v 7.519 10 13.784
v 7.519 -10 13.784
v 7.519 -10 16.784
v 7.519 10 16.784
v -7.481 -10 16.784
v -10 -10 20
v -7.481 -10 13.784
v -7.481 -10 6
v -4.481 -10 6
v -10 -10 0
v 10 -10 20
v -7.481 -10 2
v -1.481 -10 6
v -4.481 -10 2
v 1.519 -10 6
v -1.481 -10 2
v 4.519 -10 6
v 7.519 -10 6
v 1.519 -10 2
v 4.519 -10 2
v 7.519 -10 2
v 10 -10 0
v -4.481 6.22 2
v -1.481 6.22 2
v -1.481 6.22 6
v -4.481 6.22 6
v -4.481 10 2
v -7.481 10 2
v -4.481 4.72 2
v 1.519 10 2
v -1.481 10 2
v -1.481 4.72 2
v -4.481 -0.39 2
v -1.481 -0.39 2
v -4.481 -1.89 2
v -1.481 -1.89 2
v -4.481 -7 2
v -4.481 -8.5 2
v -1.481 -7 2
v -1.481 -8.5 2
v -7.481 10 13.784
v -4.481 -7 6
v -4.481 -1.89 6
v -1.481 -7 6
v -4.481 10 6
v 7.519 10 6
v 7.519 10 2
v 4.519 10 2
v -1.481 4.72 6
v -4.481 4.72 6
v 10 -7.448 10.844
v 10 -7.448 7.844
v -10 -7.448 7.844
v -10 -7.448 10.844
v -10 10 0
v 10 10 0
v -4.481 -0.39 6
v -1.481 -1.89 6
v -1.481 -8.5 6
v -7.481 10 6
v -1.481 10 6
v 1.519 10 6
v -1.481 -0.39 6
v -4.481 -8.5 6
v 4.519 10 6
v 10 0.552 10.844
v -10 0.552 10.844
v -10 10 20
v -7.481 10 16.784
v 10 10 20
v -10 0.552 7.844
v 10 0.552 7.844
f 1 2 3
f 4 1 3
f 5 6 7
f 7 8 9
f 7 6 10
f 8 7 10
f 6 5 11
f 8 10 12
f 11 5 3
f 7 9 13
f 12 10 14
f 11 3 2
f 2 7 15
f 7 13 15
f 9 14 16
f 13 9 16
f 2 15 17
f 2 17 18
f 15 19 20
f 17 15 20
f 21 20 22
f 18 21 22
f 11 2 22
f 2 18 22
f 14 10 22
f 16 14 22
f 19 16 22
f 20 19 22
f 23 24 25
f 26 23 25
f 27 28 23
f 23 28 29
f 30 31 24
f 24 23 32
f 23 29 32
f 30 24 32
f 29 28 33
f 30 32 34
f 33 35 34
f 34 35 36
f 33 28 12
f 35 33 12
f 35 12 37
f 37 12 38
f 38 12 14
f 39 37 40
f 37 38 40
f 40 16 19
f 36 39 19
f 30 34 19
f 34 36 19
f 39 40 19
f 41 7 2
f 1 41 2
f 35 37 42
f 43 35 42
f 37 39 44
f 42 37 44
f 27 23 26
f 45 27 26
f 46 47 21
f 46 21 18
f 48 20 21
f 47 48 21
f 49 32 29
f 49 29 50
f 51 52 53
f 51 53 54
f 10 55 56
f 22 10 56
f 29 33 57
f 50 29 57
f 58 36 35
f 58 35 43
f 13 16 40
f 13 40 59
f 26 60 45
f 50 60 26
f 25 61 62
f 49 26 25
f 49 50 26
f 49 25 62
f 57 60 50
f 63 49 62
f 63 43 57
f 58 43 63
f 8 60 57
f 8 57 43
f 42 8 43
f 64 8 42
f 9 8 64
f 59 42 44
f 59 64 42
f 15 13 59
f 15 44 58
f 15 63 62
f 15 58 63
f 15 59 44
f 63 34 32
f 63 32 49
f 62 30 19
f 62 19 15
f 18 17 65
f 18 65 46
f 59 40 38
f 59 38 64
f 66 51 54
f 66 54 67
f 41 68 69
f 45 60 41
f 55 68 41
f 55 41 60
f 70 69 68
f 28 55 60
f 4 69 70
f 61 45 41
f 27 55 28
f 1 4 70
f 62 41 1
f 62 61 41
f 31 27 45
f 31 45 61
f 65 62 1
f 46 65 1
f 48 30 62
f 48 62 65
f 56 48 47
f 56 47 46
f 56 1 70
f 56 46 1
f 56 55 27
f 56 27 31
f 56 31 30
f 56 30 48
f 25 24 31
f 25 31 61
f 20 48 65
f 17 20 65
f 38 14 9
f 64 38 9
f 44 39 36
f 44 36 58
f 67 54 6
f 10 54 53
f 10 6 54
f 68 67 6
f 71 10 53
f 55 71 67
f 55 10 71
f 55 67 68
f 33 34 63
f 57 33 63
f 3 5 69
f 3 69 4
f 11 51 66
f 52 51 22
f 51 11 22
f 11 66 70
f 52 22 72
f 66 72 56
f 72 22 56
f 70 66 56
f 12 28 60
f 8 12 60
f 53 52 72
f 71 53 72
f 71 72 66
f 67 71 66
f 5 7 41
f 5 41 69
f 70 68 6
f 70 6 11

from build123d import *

# Parameters (mm, degrees)
F0_W     = 20
F0_H     = 20
F1_DEPTH = 20
F2_W     = 3
F2_H     = 4
F2_W_2   = 15
F2_H_2   = 3
F3_DEPTH = 20.001
F4_W     = 8
F4_H     = 3
F5_DEPTH = 20.001
F6_W     = 1.5
F6_H     = 4
F7_DEPTH = 3


with BuildPart() as f1:
    # F0 (on Top) → F1 (new body)
    with BuildSketch(Plane.XY):
        Rectangle(F0_W, F0_H)
    extrude(amount=F1_DEPTH)

    # F2 (on face) → F3 (cut, through all)
    with BuildSketch(Plane.XZ.offset(10)):
        with Locations((-5.98057, 4)):
            Rectangle(F2_W, F2_H)
        with Locations((0.01943, 4)):
            Rectangle(F2_W, F2_H)
        with Locations((6.01943, 4)):
            Rectangle(F2_W, F2_H)
        with Locations((0.01943, 15.283564)):
            Rectangle(F2_W_2, F2_H_2)
    extrude(amount=-F3_DEPTH, mode=Mode.SUBTRACT)

    # F4 (on face) → F5 (cut, through all)
    with BuildSketch(Plane.YZ.offset(10)):
        with Locations((-3.447752, 9.344094)):
            Rectangle(F4_W, F4_H)
    extrude(amount=-F5_DEPTH, mode=Mode.SUBTRACT)

    # F6 (on face) → F7 (cut, through all)
    with BuildSketch(Plane.YZ.offset(-1.48057)):
        with Locations((-7.75, 4)):
            Rectangle(F6_W, F6_H)
        with Locations((-1.14, 4)):
            Rectangle(F6_W, F6_H)
        with Locations((5.47, 4)):
            Rectangle(F6_W, F6_H)
    extrude(amount=-F7_DEPTH, mode=Mode.SUBTRACT)


solid = f1.part
